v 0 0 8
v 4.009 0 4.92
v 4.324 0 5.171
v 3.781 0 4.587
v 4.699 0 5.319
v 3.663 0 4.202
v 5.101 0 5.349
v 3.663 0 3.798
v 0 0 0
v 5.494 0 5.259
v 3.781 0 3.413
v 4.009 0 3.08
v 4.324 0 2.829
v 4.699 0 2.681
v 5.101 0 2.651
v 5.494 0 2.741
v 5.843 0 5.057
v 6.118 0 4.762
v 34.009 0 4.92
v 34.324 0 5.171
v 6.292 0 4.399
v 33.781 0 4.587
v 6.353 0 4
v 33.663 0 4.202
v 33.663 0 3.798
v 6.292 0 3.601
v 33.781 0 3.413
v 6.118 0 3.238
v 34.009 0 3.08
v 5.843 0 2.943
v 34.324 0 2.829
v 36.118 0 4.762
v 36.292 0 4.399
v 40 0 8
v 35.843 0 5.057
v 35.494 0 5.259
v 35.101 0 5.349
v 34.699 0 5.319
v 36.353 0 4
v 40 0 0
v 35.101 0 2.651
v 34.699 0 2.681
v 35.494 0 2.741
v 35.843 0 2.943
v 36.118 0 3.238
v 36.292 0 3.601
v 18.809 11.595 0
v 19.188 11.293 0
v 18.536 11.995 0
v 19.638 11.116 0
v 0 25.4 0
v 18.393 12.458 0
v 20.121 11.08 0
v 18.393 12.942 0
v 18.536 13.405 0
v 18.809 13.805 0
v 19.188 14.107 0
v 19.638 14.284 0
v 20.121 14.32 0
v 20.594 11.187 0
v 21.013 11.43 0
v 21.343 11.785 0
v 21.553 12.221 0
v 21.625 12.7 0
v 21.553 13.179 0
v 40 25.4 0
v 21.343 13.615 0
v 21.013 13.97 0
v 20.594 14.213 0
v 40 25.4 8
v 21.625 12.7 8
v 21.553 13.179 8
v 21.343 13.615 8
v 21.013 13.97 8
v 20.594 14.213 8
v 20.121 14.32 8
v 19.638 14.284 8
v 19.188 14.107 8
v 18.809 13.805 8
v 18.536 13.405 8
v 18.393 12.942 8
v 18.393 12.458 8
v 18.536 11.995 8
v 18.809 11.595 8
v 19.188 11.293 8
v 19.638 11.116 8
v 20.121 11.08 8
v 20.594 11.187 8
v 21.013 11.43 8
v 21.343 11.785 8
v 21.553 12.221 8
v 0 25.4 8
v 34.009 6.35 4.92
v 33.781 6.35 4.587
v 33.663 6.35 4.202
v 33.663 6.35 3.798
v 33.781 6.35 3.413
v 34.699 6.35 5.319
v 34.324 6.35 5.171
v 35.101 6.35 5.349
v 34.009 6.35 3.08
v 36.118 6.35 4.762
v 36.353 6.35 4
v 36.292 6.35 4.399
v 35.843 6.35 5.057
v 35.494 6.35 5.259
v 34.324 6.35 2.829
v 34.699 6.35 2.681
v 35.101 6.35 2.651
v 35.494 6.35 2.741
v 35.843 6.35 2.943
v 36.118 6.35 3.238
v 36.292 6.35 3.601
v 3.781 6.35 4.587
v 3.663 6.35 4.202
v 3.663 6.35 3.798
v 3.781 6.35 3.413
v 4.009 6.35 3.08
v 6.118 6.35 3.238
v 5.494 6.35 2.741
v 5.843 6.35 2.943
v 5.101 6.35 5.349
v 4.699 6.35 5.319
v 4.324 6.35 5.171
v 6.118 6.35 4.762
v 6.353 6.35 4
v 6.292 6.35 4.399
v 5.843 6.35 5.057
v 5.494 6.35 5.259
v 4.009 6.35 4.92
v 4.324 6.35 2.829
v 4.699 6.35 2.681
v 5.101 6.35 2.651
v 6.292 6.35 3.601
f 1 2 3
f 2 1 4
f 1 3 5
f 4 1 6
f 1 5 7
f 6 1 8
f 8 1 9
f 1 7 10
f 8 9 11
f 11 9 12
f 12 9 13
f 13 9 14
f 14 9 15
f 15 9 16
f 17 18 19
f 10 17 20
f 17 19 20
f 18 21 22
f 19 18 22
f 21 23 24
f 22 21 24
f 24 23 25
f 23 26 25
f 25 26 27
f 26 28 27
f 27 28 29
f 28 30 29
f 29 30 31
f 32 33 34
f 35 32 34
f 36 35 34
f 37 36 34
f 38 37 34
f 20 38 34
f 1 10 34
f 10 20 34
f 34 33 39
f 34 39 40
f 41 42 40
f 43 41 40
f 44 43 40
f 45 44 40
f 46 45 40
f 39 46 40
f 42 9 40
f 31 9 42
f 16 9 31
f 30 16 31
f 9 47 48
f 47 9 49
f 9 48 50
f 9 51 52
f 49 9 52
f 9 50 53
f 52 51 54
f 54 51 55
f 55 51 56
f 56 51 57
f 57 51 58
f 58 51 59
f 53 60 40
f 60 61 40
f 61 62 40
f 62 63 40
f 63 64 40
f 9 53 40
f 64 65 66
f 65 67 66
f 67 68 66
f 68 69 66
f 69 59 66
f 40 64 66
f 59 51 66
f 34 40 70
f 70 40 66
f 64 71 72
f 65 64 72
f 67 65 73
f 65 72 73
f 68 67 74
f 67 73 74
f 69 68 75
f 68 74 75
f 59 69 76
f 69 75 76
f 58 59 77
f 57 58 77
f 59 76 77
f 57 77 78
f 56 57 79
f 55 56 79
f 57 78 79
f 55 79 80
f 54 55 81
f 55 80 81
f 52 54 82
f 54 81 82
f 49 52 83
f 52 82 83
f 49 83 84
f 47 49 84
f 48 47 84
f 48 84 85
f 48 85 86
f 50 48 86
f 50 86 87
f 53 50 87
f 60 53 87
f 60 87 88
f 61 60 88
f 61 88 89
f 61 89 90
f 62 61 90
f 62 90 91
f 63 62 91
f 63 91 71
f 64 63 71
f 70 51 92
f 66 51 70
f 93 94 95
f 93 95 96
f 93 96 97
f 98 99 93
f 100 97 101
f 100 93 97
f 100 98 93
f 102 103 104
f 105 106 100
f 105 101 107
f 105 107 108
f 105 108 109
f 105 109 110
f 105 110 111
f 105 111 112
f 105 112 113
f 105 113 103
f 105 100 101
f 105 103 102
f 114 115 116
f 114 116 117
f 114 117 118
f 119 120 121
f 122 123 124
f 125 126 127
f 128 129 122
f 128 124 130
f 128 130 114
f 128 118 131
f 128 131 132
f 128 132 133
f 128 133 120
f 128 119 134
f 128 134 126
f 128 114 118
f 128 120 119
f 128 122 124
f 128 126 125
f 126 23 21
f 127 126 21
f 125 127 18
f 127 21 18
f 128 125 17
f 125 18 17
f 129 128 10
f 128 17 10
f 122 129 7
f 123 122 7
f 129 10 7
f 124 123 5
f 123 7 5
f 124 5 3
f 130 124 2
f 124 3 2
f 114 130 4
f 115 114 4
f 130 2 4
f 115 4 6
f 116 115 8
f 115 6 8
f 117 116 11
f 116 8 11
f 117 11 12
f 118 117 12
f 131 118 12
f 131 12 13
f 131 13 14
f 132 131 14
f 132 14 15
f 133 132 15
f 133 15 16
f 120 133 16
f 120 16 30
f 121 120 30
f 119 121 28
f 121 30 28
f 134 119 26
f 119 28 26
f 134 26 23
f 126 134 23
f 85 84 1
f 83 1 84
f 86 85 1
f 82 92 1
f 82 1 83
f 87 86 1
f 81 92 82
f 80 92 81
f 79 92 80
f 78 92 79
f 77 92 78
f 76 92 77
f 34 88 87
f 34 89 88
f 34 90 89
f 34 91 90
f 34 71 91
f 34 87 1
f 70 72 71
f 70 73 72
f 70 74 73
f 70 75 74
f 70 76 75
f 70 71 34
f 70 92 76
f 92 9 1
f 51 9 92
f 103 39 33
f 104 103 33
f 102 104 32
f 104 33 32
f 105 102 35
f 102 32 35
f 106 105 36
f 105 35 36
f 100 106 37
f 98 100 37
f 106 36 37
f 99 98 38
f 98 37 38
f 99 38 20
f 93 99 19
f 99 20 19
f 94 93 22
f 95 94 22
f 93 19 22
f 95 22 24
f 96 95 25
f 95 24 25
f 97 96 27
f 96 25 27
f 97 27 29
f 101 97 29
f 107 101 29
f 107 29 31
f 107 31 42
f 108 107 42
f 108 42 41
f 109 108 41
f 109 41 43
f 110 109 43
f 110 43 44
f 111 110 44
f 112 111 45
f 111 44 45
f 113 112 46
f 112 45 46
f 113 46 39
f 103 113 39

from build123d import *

# Parameters (mm, degrees)
F0_W     = 40
F0_H     = 25.4
F1_DEPTH = 8
F3_R     = 1.35255
F4_DEPTH = 6.35
F2_R     = 1.625
F5_DEPTH = 25.4


with BuildPart() as f1:
    # F0 (on Top) → F1 (new body)
    with BuildSketch(Plane.XY):
        with Locations((20, 12.7)):
            Rectangle(F0_W, F0_H)
    extrude(amount=F1_DEPTH)

    # F3 (on face) → F4 (cut)
    with BuildSketch(Plane.XZ):
        with Locations((5, 4)):
            Circle(F3_R)
        with Locations((35, 4)):
            Circle(F3_R)
    extrude(amount=-F4_DEPTH, mode=Mode.SUBTRACT)

    # F2 (on face) → F5 (cut)
    with BuildSketch(Plane.XY.offset(8)):
        with Locations((20, 12.7)):
            Circle(F2_R)
    extrude(amount=-F5_DEPTH, mode=Mode.SUBTRACT)


solid = f1.part
